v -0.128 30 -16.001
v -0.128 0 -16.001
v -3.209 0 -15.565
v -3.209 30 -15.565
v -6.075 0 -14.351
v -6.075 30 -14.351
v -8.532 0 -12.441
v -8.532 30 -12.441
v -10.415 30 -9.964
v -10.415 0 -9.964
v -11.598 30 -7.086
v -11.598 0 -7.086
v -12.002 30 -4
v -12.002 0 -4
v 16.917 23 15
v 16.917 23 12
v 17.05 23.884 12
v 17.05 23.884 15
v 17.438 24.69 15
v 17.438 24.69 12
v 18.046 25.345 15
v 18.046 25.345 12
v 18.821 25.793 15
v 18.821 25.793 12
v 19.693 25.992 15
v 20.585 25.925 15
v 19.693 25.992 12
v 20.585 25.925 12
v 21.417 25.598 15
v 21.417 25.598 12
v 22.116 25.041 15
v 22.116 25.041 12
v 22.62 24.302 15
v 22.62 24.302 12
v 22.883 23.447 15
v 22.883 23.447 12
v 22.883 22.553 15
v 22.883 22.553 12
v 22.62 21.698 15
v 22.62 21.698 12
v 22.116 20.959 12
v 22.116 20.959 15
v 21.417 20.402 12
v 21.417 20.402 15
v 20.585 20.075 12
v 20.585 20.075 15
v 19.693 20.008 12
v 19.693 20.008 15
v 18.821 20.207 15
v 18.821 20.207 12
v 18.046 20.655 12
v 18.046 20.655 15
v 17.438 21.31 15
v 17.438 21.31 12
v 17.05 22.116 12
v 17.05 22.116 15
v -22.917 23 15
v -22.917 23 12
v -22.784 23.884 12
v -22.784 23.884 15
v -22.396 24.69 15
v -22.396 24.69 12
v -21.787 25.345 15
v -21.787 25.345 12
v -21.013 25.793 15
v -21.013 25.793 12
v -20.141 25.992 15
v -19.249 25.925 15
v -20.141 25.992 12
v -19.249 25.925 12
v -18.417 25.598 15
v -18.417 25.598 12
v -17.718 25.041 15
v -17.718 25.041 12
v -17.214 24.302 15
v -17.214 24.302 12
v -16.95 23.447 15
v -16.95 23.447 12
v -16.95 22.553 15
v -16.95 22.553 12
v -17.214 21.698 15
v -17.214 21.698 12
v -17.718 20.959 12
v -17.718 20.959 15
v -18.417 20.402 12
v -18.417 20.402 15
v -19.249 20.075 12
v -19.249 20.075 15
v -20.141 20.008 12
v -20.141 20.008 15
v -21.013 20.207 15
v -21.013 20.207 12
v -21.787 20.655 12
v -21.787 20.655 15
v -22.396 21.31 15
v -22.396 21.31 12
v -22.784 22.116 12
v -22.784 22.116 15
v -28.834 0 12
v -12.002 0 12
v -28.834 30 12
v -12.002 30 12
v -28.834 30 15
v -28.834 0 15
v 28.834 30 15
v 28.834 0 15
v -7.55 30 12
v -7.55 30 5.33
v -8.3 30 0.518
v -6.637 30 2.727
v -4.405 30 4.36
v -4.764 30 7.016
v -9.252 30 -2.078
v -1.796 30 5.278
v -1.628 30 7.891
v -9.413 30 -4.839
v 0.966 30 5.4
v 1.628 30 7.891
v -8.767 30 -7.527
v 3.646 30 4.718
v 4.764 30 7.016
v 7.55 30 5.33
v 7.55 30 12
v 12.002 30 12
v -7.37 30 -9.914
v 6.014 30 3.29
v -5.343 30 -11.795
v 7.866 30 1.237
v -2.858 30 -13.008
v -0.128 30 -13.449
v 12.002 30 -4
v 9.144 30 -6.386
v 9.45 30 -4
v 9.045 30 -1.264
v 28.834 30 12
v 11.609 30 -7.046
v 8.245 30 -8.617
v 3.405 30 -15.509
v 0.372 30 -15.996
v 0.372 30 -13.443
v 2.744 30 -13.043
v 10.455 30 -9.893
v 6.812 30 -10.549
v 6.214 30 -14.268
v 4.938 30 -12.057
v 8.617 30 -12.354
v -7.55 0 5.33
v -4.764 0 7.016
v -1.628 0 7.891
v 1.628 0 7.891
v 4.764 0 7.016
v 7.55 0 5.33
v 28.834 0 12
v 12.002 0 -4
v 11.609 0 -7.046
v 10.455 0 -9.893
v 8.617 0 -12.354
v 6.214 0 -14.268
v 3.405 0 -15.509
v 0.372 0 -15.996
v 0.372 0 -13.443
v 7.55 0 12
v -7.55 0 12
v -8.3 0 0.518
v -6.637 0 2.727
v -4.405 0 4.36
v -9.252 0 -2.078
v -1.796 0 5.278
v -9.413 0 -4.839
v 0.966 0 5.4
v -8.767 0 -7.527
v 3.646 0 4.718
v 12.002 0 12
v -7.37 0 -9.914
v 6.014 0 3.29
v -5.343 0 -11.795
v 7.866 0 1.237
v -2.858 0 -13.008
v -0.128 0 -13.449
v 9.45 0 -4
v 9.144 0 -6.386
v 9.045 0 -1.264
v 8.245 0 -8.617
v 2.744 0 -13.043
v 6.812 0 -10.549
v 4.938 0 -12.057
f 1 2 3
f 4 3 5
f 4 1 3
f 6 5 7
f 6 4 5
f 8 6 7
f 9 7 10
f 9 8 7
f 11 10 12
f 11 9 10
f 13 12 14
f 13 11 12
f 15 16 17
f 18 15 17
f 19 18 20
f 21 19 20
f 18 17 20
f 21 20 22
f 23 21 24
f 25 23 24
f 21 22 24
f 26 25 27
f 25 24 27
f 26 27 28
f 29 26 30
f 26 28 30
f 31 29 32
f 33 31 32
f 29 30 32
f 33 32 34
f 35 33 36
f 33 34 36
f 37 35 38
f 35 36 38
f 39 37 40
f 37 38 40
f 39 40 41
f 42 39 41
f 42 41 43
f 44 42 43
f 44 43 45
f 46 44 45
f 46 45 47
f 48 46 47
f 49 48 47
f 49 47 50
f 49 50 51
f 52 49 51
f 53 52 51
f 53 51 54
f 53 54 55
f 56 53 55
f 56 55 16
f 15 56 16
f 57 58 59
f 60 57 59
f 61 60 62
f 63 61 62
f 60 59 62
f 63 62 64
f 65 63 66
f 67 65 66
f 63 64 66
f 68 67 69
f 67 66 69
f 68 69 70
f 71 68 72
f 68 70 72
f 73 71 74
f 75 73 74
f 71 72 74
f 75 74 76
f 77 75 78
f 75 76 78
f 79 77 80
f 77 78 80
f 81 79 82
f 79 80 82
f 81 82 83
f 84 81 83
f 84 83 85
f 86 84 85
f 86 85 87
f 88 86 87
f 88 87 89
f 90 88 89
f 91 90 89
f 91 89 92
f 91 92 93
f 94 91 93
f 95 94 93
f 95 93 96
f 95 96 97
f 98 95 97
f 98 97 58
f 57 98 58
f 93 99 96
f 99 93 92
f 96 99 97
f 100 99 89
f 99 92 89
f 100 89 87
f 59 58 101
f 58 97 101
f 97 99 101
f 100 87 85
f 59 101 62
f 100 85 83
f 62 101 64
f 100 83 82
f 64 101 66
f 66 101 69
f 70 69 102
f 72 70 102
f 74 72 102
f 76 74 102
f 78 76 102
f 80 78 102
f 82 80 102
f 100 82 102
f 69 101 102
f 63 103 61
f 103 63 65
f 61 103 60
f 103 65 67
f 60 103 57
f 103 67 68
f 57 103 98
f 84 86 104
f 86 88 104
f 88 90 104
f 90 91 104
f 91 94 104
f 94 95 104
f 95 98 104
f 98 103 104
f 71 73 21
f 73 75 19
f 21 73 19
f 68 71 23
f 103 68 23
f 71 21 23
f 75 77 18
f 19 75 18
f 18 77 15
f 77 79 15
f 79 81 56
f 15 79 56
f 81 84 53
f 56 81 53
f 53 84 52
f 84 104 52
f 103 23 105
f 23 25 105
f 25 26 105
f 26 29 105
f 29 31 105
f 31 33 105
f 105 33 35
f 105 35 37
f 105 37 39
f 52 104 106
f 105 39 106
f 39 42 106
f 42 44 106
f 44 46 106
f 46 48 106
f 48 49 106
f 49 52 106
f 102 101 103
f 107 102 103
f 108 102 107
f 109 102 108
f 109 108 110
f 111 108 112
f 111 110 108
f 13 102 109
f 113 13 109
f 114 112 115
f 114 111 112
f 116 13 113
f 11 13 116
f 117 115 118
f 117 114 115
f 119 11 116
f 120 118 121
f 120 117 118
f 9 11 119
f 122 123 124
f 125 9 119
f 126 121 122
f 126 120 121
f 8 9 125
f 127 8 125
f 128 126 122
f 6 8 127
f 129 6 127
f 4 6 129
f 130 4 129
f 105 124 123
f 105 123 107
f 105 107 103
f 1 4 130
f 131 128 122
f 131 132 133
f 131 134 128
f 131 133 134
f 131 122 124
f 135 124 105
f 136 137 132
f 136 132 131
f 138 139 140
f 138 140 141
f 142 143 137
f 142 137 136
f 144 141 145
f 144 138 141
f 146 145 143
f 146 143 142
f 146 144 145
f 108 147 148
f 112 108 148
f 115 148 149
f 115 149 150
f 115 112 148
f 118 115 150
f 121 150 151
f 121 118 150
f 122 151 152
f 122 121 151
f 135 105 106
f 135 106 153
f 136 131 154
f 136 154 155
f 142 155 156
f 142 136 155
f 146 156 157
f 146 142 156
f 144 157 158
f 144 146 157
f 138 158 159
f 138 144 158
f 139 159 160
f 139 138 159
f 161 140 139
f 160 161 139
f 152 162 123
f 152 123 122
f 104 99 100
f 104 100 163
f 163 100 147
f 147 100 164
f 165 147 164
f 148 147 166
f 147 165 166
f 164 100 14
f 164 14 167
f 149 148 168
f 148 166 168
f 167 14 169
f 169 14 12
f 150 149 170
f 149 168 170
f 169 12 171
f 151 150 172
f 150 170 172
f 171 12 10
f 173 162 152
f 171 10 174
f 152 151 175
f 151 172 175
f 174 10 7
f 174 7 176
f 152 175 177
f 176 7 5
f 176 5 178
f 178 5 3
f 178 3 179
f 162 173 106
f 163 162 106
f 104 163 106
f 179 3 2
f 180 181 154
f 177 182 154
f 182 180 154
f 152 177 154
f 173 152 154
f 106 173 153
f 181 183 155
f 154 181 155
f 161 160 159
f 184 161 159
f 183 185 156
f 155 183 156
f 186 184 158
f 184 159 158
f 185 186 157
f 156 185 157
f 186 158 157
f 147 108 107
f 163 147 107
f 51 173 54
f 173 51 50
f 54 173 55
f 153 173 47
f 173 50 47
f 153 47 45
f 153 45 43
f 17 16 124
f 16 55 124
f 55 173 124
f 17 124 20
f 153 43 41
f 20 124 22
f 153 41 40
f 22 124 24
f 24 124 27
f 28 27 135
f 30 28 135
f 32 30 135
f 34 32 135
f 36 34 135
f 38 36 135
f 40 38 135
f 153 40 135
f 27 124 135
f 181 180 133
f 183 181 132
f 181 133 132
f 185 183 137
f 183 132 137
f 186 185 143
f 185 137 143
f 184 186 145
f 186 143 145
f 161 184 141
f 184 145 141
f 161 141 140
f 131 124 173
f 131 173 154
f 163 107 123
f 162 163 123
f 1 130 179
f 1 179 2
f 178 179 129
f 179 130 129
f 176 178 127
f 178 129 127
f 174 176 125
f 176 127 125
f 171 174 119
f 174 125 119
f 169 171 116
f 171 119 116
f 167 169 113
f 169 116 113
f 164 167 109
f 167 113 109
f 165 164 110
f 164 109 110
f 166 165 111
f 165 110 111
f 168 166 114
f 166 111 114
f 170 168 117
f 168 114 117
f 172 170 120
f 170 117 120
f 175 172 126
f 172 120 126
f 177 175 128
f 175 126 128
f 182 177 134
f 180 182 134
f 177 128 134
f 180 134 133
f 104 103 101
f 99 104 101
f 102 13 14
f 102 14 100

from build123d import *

# Parameters (mm, degrees)
SKETCH1_W           = 57.667844522
SKETCH1_H           = 30
BOSS_EXTRUDE1_DEPTH = 30
SKETCH2_R           = 4
CUT_EXTRUDE2_DEPTH  = 40
SKETCH4_R           = 8
SKETCH4_R_2         = 4
CUT_EXTRUDE3_DEPTH  = 31
SKETCH5_R           = 3
CUT_EXTRUDE4_DEPTH  = 4
SKETCH6_R           = 9.45
CUT_EXTRUDE6_DEPTH  = 31
BOSS_EXTRUDE2_DEPTH = 30
SKETCH8_W           = 0.5
SKETCH8_H           = 6.199937256
CUT_EXTRUDE7_DEPTH  = 31


with BuildPart() as part:
    # Sketch1 → Boss-Extrude1 (new body)
    with BuildSketch(Plane(origin=(0, 0, 0), x_dir=(1, 0, 0), z_dir=(0, 1, 0))):
        Rectangle(SKETCH1_W, SKETCH1_H)
    extrude(amount=BOSS_EXTRUDE1_DEPTH)

    # Sketch2 → Cut-Extrude2 (cut)
    with BuildSketch(Plane(origin=(0, 30, 0), x_dir=(1, 0, 0), z_dir=(0, 1, 0))):
        with Locations((0, 4)):
            Circle(SKETCH2_R)
    extrude(amount=-CUT_EXTRUDE2_DEPTH, mode=Mode.SUBTRACT)

    # Sketch4 → Cut-Extrude3 (cut, through all)
    with BuildSketch(Plane(origin=(0, 30, 0), x_dir=(1, 0, 0), z_dir=(0, 1, 0))):
        with Locations((0, 4)):
            Circle(SKETCH4_R)
        with Locations((0, 4)):
            Circle(SKETCH4_R_2, mode=Mode.SUBTRACT)
        with BuildLine():
            ThreePointArc((-11, 4), (-7.778174609, 11.778174577), (-4.5e-08, 15))
            Line((-4.5e-08, 15), (-28.833922261, 15))
            Line((-28.833922261, 15), (-28.833922261, -12))
            Line((-28.833922261, -12), (-11, -12))
            Line((-11, -12), (-11, 4))
        make_face()
        with BuildLine():
            ThreePointArc((-4.5e-08, 15), (7.778174577, 11.778174609), (11, 4))
            Line((11, 4), (11, -12))
            Line((11, -12), (28.833922261, -12))
            Line((28.833922261, -12), (28.833922261, 15))
            Line((28.833922261, 15), (-4.5e-08, 15))
        make_face()
        with BuildLine():
            Line((7.549834435, -12), (7.549834435, -4))
            ThreePointArc((7.549834435, -4), (0, -7), (-7.549834435, -4))
            Line((-7.549834435, -4), (-7.549834435, -12))
            Line((-7.549834435, -12), (7.549834435, -12))
        make_face()
    extrude(amount=-CUT_EXTRUDE3_DEPTH, mode=Mode.SUBTRACT)

    # Sketch5 → Cut-Extrude4 (cut, through all)
    with BuildSketch(Plane(origin=(0, 0, 12), x_dir=(-1, 0, 0), z_dir=(0, 0, -1))):
        with Locations((-19.916961131, 23)):
            Circle(SKETCH5_R)
        with Locations((19.916961131, 23)):
            Circle(SKETCH5_R)
    extrude(amount=-CUT_EXTRUDE4_DEPTH, mode=Mode.SUBTRACT)

    # Sketch6 → Cut-Extrude6 (cut, through all)
    with BuildSketch(Plane(origin=(0, 30, 0), x_dir=(1, 0, 0), z_dir=(0, 1, 0))):
        with Locations((0, 4)):
            Circle(SKETCH6_R)
    extrude(amount=-CUT_EXTRUDE6_DEPTH, mode=Mode.SUBTRACT)

    # Sketch7 → Boss-Extrude2 (add, through all)
    with BuildSketch(Plane(origin=(0, 30, 0), x_dir=(1, 0, 0), z_dir=(0, 1, 0))):
        with BuildLine():
            Line((11, 4), (11, -12))
            Line((11, -12), (12.001946675, -12))
            Line((12.001946675, -12), (12.001946675, 4))
            ThreePointArc((12.001946675, 4), (0, 16.001946675), (-12.001946675, 4))
            Line((-12.001946675, 4), (-12.001946675, -12))
            Line((-12.001946675, -12), (-11, -12))
            Line((-11, -12), (-11, 4))
            ThreePointArc((-11, 4), (0, 15), (11, 4))
        make_face()
        with BuildLine():
            ThreePointArc((-7.549834435, -5.329883385), (0, -8.001946675), (7.549834435, -5.329883385))
            Line((7.549834435, -5.329883385), (7.549834435, -4))
            ThreePointArc((7.549834435, -4), (0, -7), (-7.549834435, -4))
            Line((-7.549834435, -4), (-7.549834435, -5.329883385))
        make_face()
    extrude(amount=-BOSS_EXTRUDE2_DEPTH)

    # Sketch8 → Cut-Extrude7 (cut, through all)
    with BuildSketch(Plane(origin=(0, 30, 0), x_dir=(1, 0, 0), z_dir=(0, 1, 0))):
        with Locations((0.121996235, 15.101825576)):
            Rectangle(SKETCH8_W, SKETCH8_H)
    extrude(amount=-CUT_EXTRUDE7_DEPTH, mode=Mode.SUBTRACT)


solid = part.part
